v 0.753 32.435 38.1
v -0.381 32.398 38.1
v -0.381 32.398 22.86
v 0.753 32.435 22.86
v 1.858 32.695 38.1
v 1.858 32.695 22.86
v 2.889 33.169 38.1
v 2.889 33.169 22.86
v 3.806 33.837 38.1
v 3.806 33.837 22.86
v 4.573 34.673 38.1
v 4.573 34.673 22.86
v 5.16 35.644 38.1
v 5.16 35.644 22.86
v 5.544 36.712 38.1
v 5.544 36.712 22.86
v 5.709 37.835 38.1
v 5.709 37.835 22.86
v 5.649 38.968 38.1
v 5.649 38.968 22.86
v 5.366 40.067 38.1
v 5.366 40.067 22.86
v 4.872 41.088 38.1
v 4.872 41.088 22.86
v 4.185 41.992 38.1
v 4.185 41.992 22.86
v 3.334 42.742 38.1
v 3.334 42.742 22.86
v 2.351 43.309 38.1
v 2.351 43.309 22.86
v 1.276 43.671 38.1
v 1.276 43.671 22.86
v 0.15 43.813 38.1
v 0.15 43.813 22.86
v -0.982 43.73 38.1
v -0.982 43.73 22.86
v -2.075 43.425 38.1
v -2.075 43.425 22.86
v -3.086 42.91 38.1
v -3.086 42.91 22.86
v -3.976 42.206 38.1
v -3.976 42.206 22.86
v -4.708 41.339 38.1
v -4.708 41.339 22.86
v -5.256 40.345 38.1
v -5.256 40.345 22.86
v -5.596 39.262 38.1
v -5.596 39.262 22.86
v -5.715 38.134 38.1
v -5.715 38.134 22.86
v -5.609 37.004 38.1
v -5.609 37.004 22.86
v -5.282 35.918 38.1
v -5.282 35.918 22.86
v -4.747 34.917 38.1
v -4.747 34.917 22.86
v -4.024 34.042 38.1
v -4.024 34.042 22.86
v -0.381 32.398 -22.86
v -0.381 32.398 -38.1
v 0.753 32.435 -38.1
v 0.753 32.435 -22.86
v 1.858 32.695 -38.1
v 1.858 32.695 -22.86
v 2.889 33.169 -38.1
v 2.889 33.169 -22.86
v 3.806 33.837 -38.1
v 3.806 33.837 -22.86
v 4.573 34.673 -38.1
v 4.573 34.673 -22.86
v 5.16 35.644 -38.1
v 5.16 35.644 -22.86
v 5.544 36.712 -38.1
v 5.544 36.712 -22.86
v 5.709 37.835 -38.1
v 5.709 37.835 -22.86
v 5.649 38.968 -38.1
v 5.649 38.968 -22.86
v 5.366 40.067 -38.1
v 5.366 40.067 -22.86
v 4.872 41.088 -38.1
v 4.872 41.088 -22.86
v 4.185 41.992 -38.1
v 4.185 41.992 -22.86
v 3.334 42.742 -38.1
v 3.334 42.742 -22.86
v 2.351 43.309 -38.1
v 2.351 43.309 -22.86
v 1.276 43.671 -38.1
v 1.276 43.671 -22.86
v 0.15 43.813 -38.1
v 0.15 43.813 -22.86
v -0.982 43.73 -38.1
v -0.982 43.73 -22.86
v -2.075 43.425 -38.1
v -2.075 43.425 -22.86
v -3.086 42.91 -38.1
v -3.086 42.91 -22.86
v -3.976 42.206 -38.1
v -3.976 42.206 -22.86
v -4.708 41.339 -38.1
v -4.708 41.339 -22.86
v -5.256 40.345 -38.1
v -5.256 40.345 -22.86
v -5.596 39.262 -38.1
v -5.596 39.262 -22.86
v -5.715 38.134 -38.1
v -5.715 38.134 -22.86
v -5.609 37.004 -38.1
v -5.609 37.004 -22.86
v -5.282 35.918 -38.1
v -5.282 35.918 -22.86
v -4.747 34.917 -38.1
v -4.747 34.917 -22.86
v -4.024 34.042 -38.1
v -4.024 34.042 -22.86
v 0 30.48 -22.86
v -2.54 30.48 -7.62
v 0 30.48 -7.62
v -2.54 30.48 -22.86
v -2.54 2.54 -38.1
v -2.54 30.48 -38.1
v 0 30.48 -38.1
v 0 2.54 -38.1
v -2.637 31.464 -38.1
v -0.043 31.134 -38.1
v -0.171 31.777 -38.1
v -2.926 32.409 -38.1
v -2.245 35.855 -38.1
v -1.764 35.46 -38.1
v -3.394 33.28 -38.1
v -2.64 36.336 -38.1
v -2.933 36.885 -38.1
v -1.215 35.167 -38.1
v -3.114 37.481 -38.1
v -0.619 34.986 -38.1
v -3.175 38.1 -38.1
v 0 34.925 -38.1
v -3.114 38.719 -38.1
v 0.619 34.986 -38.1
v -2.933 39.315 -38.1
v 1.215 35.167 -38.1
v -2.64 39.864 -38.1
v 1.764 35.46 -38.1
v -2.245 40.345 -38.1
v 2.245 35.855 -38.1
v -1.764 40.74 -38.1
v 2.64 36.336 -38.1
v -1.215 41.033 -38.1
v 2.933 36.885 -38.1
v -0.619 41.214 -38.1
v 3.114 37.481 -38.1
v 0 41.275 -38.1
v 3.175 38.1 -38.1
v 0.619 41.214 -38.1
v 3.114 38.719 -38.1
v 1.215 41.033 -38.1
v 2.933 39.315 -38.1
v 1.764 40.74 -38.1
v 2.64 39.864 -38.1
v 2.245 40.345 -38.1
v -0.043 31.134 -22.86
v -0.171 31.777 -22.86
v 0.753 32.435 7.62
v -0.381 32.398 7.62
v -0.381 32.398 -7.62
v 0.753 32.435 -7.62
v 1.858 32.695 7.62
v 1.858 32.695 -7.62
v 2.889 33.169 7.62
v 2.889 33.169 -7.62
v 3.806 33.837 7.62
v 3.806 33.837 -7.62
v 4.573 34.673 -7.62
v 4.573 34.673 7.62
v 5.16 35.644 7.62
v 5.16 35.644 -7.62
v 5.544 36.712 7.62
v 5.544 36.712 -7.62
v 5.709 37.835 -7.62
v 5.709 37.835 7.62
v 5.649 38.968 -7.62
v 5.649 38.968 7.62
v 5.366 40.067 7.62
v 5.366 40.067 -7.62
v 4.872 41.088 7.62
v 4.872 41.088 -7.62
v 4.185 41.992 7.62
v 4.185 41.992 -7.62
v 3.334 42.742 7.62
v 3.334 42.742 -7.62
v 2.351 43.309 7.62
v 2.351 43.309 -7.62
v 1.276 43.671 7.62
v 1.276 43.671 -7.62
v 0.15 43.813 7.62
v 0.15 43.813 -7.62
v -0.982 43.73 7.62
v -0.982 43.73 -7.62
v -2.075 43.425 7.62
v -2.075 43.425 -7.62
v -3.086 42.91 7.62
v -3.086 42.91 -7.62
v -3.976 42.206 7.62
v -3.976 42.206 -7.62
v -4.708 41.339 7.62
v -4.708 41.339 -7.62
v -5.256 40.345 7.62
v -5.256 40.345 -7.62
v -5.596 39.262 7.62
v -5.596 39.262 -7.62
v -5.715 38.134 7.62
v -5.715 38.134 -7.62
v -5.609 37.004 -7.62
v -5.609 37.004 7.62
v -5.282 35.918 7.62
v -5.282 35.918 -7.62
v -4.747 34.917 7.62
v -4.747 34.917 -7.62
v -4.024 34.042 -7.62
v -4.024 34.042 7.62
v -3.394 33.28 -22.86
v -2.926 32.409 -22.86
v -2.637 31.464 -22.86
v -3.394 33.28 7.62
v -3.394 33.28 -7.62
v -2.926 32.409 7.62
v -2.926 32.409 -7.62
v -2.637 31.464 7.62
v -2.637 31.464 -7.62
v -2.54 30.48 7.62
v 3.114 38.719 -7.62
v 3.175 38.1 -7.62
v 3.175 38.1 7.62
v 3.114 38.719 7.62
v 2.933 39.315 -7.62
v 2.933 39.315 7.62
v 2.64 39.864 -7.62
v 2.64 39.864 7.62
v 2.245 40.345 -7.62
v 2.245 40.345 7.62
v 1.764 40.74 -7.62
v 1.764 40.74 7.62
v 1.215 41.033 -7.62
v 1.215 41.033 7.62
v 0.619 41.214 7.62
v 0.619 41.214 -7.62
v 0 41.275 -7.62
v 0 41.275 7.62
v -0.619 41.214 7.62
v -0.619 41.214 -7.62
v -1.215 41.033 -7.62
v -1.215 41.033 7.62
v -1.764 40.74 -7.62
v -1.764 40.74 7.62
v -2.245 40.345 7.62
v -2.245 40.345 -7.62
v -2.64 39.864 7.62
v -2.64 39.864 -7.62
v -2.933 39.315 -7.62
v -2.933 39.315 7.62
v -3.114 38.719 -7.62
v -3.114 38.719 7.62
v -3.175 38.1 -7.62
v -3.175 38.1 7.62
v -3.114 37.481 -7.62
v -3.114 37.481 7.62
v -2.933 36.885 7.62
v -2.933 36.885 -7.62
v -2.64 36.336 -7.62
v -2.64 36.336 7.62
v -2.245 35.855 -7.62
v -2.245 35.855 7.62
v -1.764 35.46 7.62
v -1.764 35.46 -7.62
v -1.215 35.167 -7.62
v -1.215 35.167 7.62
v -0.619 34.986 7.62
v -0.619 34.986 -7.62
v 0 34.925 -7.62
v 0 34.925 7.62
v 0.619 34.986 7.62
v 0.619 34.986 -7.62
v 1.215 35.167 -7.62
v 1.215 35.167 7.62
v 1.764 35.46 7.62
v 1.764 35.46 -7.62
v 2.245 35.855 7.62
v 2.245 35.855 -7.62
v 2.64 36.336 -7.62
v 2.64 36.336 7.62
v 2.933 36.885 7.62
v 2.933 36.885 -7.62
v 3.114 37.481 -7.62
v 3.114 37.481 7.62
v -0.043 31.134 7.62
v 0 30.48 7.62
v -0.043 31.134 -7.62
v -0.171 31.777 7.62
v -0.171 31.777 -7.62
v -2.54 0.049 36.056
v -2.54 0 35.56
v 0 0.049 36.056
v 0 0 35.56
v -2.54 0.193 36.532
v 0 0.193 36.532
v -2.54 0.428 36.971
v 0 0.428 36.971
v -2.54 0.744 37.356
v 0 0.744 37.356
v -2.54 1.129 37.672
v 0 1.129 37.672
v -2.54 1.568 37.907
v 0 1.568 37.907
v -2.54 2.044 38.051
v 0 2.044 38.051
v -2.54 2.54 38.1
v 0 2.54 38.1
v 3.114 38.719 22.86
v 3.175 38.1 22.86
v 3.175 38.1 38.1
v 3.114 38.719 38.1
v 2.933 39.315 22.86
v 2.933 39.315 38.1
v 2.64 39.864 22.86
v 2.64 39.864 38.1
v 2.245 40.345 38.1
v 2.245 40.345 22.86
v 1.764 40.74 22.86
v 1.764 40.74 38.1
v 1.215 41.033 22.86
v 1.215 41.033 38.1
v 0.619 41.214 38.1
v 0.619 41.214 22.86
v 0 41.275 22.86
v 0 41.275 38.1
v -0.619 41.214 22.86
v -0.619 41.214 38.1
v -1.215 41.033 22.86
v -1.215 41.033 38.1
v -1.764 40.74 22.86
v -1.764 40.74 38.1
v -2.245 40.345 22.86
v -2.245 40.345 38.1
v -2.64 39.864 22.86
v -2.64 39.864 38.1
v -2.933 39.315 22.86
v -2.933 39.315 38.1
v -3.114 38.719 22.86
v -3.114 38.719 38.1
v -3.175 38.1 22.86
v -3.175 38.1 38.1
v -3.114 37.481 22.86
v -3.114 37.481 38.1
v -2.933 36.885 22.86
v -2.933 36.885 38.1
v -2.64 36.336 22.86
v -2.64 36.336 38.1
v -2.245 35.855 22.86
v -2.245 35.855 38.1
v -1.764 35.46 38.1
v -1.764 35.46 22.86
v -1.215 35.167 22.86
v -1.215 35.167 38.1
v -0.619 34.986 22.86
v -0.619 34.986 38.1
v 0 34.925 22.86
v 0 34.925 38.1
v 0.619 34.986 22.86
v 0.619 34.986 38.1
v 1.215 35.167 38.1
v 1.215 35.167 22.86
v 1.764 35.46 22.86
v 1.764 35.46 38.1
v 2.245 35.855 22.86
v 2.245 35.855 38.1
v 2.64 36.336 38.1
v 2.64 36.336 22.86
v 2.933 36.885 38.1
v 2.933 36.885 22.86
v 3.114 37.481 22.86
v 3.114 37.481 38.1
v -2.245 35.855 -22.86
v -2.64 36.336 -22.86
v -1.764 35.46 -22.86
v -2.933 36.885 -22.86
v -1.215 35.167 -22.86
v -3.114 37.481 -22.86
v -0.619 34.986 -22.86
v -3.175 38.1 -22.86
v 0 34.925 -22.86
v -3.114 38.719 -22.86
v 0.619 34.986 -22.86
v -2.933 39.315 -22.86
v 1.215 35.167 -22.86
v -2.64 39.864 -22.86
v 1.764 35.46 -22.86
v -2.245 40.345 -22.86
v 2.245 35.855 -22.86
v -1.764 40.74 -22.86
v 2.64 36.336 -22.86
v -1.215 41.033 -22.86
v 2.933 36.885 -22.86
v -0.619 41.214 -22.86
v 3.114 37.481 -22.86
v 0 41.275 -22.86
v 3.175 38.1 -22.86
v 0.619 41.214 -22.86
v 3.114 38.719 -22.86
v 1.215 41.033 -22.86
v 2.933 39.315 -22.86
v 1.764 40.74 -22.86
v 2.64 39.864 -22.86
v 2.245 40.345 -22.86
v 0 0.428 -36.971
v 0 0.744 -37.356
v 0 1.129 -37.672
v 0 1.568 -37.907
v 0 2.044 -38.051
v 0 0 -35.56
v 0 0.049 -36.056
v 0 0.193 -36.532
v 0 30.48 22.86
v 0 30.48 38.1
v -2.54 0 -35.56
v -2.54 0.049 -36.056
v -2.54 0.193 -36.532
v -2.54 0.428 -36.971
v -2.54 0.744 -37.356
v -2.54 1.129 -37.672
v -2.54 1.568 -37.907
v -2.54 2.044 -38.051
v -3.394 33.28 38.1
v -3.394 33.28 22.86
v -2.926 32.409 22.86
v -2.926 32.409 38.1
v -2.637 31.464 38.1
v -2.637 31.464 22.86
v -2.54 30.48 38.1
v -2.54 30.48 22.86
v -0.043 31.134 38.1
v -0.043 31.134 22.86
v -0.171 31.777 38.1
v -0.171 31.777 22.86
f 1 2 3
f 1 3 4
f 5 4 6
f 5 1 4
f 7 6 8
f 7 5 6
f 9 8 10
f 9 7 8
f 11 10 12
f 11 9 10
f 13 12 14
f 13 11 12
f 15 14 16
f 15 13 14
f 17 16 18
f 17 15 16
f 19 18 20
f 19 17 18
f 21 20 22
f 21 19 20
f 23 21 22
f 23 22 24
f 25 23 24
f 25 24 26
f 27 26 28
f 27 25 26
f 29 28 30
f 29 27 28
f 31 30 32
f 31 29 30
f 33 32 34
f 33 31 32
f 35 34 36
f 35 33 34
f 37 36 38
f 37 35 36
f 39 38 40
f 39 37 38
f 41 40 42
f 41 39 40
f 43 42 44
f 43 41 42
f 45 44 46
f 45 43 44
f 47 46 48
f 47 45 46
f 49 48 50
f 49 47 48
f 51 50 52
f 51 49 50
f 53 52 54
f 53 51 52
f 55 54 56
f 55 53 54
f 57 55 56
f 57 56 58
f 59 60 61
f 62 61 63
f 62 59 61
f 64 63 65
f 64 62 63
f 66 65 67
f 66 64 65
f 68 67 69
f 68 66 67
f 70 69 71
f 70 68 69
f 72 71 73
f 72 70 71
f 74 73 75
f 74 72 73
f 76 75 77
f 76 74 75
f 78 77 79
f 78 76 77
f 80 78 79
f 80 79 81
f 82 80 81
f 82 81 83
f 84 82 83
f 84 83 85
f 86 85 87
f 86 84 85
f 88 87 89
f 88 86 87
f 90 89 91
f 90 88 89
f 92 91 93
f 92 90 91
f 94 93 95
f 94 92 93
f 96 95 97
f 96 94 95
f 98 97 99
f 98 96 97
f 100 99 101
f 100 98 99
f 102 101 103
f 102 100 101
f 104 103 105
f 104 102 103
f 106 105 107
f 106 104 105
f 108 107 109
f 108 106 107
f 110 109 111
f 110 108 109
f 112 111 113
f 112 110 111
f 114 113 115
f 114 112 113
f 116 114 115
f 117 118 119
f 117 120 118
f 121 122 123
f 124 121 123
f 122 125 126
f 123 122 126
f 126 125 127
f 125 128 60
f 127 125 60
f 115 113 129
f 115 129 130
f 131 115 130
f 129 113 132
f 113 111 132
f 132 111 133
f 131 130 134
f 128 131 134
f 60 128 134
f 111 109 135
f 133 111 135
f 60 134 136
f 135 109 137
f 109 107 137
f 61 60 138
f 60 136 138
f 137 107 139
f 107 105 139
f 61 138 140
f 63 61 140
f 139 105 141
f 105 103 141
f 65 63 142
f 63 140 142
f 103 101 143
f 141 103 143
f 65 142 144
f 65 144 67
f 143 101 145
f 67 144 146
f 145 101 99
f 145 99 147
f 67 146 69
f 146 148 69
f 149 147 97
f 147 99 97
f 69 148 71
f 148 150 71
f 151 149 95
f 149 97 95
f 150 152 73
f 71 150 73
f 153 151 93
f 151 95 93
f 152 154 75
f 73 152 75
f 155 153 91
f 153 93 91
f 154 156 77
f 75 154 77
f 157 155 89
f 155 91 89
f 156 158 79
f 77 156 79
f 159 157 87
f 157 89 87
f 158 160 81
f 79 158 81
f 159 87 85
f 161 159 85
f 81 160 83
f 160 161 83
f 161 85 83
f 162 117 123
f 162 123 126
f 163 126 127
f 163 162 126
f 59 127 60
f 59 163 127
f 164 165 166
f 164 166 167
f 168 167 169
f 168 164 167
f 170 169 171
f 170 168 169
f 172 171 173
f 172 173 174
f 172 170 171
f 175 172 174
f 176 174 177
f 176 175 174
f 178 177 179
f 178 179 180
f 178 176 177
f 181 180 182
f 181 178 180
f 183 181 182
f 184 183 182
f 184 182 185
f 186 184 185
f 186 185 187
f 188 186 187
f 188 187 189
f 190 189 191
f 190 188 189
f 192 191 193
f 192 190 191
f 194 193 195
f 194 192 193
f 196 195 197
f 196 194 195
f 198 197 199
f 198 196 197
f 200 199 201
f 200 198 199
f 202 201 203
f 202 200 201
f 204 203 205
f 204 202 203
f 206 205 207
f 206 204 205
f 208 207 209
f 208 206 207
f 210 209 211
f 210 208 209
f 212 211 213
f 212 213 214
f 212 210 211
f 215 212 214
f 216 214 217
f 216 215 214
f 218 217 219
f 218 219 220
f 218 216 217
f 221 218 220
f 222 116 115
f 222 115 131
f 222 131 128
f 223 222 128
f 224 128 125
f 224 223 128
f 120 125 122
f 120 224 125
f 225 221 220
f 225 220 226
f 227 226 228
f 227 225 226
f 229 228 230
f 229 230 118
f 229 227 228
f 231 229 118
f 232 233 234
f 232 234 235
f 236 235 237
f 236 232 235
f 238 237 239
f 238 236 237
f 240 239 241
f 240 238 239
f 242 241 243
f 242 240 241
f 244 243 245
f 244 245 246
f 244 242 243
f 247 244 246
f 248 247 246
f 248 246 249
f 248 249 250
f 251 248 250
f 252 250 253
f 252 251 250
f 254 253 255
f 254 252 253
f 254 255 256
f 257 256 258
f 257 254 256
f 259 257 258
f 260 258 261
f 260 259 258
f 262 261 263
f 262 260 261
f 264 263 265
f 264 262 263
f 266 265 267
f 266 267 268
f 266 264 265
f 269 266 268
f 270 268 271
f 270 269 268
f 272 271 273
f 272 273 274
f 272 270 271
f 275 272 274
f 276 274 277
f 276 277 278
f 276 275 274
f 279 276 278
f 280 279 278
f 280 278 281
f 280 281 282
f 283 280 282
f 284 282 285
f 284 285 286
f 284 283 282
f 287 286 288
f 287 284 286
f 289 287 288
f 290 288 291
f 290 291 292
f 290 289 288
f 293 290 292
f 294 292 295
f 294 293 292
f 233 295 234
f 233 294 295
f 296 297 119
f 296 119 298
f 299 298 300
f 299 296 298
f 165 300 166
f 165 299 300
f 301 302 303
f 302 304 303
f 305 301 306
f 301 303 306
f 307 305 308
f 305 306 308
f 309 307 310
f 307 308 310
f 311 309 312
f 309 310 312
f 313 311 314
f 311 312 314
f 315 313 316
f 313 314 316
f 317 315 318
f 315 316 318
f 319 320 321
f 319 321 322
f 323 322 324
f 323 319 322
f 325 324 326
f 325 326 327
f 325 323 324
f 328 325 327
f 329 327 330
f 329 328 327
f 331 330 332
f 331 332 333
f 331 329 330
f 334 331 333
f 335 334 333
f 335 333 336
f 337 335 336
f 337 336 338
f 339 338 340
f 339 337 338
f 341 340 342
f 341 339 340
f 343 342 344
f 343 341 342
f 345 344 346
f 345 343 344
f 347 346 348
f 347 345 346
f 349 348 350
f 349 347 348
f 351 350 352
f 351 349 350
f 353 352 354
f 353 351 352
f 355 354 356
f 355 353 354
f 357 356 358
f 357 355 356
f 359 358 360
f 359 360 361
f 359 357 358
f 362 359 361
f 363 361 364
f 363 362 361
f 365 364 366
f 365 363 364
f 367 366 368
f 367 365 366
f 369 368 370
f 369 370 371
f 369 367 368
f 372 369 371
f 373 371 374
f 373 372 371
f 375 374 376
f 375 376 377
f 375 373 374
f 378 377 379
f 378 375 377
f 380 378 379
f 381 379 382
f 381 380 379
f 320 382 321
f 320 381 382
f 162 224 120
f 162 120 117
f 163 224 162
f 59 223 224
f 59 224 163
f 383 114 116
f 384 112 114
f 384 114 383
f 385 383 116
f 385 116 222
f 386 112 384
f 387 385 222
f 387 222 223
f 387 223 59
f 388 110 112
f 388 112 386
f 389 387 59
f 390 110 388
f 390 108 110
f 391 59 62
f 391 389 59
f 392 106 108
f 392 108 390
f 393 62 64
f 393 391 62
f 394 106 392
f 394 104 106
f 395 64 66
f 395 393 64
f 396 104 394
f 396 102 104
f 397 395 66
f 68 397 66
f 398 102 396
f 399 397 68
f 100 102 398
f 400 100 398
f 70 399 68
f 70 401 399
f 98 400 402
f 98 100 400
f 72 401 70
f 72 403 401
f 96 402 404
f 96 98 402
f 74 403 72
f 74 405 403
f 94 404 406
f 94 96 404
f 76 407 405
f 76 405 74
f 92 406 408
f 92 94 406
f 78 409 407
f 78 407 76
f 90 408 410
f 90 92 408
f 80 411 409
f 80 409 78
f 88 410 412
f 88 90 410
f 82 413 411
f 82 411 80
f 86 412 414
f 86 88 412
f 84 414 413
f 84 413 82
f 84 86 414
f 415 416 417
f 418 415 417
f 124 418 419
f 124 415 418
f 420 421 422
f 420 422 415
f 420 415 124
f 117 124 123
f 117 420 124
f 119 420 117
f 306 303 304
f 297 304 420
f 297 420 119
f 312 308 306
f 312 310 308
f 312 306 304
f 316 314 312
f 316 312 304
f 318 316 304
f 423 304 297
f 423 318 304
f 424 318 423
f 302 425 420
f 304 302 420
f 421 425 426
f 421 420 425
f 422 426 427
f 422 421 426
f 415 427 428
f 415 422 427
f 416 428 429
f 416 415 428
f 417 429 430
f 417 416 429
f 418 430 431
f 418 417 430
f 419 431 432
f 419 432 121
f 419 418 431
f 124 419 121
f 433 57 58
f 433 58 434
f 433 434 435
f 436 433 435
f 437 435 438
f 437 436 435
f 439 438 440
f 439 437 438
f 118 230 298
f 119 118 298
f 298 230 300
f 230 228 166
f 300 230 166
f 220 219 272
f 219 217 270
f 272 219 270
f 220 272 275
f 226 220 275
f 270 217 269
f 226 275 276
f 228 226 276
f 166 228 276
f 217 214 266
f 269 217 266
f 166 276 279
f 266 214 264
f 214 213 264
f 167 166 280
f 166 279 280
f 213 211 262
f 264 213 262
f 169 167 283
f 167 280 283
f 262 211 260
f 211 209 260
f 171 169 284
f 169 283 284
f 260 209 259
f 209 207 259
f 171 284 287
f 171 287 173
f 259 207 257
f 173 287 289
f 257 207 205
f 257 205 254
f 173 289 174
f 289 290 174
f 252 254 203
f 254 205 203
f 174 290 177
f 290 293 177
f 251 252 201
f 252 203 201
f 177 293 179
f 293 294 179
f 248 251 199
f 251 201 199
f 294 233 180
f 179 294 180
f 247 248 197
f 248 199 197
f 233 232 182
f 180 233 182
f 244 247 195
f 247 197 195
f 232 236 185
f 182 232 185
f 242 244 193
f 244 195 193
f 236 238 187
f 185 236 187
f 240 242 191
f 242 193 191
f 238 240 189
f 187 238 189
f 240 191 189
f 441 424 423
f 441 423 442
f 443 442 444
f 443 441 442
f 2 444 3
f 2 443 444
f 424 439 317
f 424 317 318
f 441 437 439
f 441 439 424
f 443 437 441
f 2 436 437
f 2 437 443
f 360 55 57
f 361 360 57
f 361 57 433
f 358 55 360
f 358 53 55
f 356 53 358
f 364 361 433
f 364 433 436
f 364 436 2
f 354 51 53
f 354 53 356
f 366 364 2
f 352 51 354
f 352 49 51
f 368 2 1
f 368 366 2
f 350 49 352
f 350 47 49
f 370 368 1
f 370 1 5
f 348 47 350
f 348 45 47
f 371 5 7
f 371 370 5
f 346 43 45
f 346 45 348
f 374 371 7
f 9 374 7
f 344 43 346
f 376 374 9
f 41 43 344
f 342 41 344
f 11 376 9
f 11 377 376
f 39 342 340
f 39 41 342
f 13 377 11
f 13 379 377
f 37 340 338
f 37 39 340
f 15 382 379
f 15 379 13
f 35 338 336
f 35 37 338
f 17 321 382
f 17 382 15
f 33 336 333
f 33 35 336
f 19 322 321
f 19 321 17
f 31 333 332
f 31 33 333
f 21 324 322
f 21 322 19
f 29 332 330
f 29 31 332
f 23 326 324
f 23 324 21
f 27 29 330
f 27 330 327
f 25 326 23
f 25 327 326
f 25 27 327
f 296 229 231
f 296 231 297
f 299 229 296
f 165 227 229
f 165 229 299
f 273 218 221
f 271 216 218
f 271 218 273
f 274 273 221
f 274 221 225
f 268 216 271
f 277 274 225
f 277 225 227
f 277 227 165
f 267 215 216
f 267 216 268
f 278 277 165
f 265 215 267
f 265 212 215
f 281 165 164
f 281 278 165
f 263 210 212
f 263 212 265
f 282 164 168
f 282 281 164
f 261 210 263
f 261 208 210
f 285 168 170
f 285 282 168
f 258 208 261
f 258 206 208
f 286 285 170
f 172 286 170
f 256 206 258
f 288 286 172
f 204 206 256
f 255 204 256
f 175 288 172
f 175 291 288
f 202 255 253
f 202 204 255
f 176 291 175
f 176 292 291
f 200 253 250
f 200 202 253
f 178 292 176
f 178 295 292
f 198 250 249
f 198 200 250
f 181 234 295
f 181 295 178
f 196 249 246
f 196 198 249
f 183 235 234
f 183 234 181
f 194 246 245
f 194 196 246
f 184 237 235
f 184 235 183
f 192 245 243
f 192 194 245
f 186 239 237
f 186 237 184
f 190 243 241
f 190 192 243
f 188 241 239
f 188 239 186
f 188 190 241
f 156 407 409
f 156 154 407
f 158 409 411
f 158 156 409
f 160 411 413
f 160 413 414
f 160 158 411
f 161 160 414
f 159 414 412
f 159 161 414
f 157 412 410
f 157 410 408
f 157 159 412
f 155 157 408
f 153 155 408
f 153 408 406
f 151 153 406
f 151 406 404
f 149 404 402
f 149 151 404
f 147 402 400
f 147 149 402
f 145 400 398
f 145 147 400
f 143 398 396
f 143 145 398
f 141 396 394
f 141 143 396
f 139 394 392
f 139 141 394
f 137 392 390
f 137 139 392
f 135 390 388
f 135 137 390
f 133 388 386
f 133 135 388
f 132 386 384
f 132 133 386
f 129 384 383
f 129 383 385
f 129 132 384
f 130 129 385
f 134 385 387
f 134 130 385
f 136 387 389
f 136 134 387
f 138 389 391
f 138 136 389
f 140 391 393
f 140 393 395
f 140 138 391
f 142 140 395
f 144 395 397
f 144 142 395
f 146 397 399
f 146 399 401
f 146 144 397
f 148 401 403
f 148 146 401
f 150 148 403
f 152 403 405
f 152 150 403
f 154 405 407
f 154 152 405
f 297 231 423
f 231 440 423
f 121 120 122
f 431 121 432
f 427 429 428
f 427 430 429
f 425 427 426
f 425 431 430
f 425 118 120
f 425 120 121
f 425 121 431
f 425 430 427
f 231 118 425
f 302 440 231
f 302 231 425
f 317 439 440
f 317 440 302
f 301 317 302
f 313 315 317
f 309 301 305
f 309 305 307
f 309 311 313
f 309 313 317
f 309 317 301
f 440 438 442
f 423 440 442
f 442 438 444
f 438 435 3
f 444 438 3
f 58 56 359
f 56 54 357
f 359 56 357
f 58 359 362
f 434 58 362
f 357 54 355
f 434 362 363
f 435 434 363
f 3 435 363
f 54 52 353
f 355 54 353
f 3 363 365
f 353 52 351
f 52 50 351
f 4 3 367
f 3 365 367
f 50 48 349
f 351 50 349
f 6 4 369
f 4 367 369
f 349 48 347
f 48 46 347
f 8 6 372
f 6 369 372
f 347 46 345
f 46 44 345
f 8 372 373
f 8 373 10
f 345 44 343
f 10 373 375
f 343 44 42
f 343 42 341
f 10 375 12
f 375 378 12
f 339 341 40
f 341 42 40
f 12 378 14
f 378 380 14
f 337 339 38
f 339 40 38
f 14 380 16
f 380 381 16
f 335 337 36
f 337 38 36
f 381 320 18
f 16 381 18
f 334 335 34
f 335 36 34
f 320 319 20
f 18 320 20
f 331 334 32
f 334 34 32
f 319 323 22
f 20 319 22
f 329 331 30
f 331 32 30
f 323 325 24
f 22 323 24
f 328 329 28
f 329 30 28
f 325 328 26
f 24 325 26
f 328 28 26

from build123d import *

# Parameters (mm, degrees)
SKETCH1_R           = 5.715
SKETCH1_R_2         = 3.175
BOSS_EXTRUDE1_DEPTH = 38.1
SKETCH2_R           = 3.175
CUT_EXTRUDE1_DEPTH  = 7.62
FILLET1_R           = 2.54


with BuildPart() as part:
    # Sketch1 → Boss-Extrude1 (new body, symmetric)
    with BuildSketch(Plane.XY):
        with BuildLine():
            Line((-2.54, 0), (0, 0))
            Line((0, 0), (0, 30.48))
            ThreePointArc((0, 30.48), (-0.096177955, 31.457600747), (-0.381023909, 32.39771574))
            ThreePointArc((-0.381023909, 32.39771574), (-2.351034724, 32.890982749), (-4.024171598, 34.042011834))
            ThreePointArc((-4.024171598, 34.042011834), (-2.925884615, 32.409423077), (-2.54, 30.48))
            Line((-2.54, 30.48), (-2.54, 0))
        make_face()
        with Locations((0, 38.1)):
            Circle(SKETCH1_R)
        with Locations((0, 38.1)):
            Circle(SKETCH1_R_2, mode=Mode.SUBTRACT)
    extrude(amount=BOSS_EXTRUDE1_DEPTH, both=True)

    # Sketch2 → Cut-Extrude1 (cut, symmetric)
    with BuildSketch(Plane.XY.offset(15.24)):
        with BuildLine():
            ThreePointArc((0, 30.48), (-0.096177955, 31.457600747), (-0.381023909, 32.39771574))
            ThreePointArc((-0.381023909, 32.39771574), (2.351034724, 43.309017251), (-4.024171598, 34.042011834))
            ThreePointArc((-4.024171598, 34.042011834), (-2.925884615, 32.409423077), (-2.54, 30.48))
            Line((-2.54, 30.48), (0, 30.48))
        make_face()
        with Locations((0, 38.1)):
            Circle(SKETCH2_R, mode=Mode.SUBTRACT)
    cut_extrude1 = extrude(amount=CUT_EXTRUDE1_DEPTH, both=True, mode=Mode.SUBTRACT)

    # Mirror1: Cut-Extrude1 across plane
    add(cut_extrude1.mirror(Plane.XY), mode=Mode.SUBTRACT)

    # Fillet1
    fillet1_edges = [part.edges().sort_by_distance(p)[0] for p in [
        (-1.27, 0, 38.1),
        (-1.27, 0, -38.1),
    ]]
    fillet(fillet1_edges, radius=FILLET1_R)


solid = part.part
